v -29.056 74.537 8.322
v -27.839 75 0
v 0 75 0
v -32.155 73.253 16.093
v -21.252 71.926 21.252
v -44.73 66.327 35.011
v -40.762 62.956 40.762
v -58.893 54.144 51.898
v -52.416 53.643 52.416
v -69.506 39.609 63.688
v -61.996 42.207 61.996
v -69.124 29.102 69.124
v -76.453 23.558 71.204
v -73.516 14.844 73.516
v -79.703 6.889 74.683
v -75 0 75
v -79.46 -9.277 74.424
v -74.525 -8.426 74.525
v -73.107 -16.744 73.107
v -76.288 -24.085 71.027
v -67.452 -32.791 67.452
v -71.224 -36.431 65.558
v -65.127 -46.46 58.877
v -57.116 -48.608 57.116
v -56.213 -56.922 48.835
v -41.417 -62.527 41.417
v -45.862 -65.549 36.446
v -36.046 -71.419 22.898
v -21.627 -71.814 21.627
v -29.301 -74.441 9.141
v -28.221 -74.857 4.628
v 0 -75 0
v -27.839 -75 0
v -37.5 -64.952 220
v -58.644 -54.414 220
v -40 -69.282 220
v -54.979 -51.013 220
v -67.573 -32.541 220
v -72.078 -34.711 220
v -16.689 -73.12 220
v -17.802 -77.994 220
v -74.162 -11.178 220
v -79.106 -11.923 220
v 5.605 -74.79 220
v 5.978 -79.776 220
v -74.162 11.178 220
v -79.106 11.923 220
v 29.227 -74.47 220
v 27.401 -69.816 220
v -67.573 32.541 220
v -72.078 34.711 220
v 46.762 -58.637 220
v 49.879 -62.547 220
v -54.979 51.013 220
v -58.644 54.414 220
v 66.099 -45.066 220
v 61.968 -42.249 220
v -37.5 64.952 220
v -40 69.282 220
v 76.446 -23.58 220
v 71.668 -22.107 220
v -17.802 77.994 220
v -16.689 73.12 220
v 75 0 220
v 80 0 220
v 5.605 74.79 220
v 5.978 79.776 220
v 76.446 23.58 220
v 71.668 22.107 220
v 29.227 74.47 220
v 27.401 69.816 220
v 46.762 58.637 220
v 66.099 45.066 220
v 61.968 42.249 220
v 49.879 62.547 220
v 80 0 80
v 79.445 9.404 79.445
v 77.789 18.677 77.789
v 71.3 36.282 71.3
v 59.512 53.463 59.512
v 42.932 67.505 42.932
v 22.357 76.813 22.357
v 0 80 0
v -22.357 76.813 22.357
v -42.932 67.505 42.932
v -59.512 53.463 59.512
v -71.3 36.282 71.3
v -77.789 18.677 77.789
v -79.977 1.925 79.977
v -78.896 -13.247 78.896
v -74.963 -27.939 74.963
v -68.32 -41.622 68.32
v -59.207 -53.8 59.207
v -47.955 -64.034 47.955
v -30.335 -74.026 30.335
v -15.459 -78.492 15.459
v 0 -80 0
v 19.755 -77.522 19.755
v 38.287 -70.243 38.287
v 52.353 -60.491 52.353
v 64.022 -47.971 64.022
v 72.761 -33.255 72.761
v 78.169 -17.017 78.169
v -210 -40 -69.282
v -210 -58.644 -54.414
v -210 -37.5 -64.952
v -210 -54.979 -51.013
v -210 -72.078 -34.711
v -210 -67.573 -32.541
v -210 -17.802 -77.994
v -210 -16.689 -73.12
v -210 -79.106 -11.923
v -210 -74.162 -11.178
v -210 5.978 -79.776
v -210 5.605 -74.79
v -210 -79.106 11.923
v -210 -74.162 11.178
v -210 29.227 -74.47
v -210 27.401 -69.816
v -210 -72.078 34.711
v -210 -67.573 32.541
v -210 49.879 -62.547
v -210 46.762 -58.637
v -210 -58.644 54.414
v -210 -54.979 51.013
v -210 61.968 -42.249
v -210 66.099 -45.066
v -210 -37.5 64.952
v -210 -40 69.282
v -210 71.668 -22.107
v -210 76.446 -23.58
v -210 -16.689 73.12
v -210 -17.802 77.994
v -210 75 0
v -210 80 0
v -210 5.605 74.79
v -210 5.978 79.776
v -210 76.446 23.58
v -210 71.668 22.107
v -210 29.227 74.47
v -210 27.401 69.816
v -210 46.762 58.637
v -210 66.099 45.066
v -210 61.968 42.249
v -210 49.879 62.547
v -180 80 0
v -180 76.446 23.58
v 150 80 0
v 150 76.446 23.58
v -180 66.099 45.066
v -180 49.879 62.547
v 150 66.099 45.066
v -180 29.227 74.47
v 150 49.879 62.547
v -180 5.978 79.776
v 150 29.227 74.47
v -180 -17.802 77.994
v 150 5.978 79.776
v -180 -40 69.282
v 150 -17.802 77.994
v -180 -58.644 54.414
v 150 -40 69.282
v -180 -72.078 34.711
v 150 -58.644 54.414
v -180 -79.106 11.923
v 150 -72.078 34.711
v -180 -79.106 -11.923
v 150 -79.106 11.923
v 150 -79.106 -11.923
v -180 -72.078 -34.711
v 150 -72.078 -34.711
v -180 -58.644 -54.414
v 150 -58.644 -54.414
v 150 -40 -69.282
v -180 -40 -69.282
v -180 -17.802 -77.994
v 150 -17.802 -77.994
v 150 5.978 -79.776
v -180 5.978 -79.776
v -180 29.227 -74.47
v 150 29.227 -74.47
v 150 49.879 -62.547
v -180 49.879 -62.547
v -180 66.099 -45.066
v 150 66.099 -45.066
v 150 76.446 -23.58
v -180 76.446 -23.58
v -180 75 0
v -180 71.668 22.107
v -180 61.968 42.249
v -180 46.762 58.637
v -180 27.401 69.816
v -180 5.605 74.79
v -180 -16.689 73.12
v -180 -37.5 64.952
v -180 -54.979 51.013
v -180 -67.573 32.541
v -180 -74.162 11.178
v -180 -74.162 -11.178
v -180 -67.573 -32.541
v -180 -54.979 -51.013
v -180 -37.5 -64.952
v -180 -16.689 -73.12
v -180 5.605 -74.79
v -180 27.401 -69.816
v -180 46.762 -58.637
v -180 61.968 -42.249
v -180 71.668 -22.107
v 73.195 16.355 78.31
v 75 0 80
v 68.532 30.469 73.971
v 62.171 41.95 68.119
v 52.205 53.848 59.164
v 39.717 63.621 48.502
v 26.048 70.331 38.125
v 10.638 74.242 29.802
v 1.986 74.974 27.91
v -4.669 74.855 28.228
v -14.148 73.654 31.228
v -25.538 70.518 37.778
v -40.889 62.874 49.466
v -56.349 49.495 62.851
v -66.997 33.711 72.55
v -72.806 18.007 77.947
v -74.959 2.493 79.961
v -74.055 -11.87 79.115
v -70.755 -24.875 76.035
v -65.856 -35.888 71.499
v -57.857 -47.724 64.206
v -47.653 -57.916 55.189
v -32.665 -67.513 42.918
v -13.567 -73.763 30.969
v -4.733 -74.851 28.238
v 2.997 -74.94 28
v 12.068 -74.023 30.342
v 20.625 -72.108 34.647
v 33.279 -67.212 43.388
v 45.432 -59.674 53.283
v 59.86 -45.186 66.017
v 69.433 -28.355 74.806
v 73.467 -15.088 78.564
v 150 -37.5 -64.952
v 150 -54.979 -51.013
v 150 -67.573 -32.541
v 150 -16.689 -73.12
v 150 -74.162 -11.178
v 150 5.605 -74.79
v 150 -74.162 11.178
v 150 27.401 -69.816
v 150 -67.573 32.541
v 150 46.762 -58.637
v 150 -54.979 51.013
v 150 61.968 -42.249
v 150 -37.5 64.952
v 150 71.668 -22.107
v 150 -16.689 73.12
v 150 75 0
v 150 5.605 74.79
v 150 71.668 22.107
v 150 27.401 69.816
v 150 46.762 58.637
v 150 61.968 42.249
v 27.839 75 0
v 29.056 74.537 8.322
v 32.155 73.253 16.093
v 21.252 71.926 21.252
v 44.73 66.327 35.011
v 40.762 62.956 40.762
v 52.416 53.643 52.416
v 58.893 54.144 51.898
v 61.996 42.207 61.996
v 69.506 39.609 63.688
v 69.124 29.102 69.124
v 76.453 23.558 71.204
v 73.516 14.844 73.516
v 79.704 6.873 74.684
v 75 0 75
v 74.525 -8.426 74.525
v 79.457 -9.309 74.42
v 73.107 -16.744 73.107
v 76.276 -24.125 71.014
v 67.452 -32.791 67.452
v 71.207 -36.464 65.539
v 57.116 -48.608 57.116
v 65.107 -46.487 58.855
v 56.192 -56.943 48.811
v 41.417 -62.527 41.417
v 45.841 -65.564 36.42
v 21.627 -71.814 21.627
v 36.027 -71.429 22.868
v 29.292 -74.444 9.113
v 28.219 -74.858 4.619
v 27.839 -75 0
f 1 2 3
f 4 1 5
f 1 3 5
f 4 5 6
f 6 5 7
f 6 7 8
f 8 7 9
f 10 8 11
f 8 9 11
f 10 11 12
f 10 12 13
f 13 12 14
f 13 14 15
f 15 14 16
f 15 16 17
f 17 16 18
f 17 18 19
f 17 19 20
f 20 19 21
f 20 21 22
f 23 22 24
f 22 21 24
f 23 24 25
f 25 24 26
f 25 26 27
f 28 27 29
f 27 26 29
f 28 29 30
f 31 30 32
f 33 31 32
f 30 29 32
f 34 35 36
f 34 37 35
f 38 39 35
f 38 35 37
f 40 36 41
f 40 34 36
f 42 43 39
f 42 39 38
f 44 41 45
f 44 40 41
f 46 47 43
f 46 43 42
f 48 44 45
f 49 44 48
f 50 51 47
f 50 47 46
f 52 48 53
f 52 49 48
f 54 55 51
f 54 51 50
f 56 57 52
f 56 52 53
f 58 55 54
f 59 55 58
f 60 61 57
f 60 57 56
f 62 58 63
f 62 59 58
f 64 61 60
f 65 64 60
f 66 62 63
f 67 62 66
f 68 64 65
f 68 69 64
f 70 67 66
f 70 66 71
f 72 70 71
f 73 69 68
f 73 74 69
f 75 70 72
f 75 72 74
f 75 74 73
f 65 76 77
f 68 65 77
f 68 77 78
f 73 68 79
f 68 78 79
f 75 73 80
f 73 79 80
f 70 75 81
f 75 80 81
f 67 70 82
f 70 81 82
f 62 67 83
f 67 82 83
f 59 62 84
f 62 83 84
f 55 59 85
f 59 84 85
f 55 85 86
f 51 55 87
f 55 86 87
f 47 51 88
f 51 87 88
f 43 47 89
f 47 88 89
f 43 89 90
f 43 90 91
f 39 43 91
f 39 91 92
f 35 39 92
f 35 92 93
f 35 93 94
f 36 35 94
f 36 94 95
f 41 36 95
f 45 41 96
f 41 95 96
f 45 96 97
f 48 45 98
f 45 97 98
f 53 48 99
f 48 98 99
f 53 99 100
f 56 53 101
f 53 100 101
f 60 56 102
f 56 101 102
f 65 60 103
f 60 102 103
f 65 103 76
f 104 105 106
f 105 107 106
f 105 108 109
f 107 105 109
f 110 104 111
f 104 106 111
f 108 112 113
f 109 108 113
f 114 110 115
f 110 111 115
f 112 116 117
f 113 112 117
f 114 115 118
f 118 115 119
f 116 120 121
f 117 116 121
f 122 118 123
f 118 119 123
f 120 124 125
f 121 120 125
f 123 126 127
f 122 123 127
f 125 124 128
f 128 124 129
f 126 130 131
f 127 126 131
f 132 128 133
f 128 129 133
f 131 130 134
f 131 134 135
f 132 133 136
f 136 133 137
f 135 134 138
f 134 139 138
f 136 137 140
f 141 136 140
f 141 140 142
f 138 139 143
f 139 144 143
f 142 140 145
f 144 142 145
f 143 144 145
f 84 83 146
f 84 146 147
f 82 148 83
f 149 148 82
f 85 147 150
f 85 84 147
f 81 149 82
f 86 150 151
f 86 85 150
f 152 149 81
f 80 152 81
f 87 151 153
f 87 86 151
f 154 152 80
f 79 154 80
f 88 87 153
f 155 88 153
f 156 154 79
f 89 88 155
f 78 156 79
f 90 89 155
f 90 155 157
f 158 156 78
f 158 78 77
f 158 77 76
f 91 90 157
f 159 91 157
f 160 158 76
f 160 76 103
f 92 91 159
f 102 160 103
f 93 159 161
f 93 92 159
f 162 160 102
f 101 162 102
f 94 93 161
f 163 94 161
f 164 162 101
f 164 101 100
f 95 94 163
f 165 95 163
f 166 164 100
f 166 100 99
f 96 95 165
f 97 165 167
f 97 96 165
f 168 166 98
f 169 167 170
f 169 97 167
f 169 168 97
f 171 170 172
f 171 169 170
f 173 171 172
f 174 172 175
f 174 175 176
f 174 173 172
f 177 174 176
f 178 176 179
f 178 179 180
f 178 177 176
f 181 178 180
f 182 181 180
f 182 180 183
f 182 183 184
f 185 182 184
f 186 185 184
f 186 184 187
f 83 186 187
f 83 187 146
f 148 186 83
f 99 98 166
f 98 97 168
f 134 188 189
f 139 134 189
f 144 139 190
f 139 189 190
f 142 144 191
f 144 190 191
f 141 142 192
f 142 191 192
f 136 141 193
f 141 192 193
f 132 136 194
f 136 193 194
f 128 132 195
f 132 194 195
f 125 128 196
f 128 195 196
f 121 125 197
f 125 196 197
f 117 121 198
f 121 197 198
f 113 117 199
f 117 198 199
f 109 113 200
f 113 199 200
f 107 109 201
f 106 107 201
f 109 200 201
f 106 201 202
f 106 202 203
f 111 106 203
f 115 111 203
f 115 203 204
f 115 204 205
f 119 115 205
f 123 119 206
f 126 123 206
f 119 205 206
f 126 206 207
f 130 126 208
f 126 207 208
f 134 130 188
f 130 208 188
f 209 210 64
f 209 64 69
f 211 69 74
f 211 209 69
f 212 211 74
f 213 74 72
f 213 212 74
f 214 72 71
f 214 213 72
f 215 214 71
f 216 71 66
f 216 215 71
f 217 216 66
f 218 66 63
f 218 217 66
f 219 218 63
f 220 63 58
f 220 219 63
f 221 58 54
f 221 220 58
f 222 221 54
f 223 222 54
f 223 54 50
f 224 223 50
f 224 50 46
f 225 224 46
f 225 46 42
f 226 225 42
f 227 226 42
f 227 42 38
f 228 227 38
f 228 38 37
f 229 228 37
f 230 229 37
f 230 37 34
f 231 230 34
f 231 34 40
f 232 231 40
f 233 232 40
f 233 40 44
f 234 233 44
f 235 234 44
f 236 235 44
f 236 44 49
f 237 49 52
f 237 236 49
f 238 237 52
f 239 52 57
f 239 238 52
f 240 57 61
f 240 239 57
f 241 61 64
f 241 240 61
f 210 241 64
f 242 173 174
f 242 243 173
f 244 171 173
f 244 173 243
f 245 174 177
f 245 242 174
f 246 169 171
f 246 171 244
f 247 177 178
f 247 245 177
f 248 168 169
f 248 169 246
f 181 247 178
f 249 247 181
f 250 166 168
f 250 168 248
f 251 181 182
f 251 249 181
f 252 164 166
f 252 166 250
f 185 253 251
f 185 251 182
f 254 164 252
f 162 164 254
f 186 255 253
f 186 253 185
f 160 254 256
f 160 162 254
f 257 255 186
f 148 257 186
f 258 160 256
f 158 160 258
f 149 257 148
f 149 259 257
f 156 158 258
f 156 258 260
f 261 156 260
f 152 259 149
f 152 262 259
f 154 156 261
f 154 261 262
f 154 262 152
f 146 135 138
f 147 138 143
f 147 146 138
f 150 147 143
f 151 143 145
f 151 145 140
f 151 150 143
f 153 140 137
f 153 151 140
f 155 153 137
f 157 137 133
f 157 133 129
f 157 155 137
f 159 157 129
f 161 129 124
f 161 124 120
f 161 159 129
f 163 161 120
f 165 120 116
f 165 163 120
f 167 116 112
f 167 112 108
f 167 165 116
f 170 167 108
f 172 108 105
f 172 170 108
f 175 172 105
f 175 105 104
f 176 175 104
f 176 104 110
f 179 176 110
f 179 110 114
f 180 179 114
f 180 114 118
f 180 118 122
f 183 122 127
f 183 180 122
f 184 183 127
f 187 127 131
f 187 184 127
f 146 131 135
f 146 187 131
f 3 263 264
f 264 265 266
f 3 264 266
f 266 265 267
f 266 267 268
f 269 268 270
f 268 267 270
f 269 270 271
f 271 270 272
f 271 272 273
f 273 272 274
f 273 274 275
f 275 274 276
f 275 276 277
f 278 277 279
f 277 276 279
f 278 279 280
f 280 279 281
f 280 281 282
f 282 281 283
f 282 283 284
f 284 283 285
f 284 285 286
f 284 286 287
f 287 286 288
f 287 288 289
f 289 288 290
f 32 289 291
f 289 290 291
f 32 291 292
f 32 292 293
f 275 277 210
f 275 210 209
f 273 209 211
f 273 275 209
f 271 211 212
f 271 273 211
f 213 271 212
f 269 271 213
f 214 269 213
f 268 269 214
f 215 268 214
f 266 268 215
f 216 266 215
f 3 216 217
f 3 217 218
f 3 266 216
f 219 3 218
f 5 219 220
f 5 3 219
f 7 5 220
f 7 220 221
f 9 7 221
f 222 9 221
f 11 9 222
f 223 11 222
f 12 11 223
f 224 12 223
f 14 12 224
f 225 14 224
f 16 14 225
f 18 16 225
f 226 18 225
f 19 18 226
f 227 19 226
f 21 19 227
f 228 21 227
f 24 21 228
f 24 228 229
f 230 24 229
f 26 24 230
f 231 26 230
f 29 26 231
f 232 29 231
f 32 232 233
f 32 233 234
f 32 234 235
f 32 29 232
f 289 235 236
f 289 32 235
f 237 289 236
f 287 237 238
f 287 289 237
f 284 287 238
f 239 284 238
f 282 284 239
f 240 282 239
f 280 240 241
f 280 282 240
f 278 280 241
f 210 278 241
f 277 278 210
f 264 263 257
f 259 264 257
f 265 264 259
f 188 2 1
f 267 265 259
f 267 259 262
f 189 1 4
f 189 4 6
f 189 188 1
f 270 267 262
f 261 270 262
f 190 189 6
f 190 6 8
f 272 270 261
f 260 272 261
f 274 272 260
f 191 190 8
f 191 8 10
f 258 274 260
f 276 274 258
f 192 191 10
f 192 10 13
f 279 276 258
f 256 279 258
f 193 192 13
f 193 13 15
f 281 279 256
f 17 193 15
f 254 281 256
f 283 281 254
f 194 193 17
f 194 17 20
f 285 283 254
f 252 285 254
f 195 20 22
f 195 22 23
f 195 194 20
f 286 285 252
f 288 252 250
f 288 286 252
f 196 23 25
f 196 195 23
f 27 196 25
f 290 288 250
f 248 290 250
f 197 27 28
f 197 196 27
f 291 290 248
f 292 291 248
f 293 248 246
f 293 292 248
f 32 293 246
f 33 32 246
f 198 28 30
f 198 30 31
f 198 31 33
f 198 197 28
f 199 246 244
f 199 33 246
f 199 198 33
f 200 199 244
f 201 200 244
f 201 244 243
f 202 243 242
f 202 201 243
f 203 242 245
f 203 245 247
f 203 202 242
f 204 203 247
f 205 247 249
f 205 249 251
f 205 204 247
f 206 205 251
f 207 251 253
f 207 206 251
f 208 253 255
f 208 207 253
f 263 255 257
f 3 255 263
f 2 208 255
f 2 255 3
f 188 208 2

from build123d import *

# Parameters (mm, degrees)
F0_R      = 80
F0_R_2    = 75
F1_DEPTH  = 180
F2_R      = 80
F2_R_2    = 75
F3_DEPTH  = 220
F4_DEPTH  = 30
F5_DEPTH  = 30
F6_R      = 75
F7_DEPTH  = 250
F8_R      = 75
F9_DEPTH  = 250
F10_R     = 75
F11_DEPTH = 500


with BuildPart() as f1:
    # F0 (on Right) → F1 (new body, symmetric)
    with BuildSketch(Plane.YZ):
        Circle(F0_R)
        Circle(F0_R_2, mode=Mode.SUBTRACT)
    extrude(amount=F1_DEPTH, both=True)

    # F4 (add): a face of the model
    f4_faces = [f1.faces().sort_by_distance(p)[0] for p in [
        (-180, -77.7372583002, 0),
    ]]


with BuildPart() as f3:
    # F2 (on Top) → F3 (new body)
    with BuildSketch(Plane.XY):
        Circle(F2_R)
        Circle(F2_R_2, mode=Mode.SUBTRACT)
    extrude(amount=F3_DEPTH)


with BuildPart() as f1_1:
    add(f1.part)

    add(f3.part)  # F4 merges F3
    extrude(f4_faces, amount=F4_DEPTH)

    # F5 (cut): a face of the model
    f5_faces = [f1_1.faces().sort_by_distance(p)[0] for p in [
        (180, -77.7372583002, 0),
    ]]
    extrude(f5_faces, amount=-F5_DEPTH, mode=Mode.SUBTRACT)

    # F6 (on Right) → F7 (cut, symmetric)
    with BuildSketch(Plane.YZ):
        Circle(F6_R)
    extrude(amount=F7_DEPTH, both=True, mode=Mode.SUBTRACT)

    # F8 (on Right) → F9 (cut, symmetric)
    with BuildSketch(Plane.YZ):
        Circle(F8_R)
    extrude(amount=F9_DEPTH, both=True, mode=Mode.SUBTRACT)

    # F10 (on Top) → F11 (cut)
    with BuildSketch(Plane.XY):
        Circle(F10_R)
    extrude(amount=F11_DEPTH, mode=Mode.SUBTRACT)


with BuildPart() as f12_1:
    # F12: copy of F1
    add(f1_1.part)


solid = f1_1.part
